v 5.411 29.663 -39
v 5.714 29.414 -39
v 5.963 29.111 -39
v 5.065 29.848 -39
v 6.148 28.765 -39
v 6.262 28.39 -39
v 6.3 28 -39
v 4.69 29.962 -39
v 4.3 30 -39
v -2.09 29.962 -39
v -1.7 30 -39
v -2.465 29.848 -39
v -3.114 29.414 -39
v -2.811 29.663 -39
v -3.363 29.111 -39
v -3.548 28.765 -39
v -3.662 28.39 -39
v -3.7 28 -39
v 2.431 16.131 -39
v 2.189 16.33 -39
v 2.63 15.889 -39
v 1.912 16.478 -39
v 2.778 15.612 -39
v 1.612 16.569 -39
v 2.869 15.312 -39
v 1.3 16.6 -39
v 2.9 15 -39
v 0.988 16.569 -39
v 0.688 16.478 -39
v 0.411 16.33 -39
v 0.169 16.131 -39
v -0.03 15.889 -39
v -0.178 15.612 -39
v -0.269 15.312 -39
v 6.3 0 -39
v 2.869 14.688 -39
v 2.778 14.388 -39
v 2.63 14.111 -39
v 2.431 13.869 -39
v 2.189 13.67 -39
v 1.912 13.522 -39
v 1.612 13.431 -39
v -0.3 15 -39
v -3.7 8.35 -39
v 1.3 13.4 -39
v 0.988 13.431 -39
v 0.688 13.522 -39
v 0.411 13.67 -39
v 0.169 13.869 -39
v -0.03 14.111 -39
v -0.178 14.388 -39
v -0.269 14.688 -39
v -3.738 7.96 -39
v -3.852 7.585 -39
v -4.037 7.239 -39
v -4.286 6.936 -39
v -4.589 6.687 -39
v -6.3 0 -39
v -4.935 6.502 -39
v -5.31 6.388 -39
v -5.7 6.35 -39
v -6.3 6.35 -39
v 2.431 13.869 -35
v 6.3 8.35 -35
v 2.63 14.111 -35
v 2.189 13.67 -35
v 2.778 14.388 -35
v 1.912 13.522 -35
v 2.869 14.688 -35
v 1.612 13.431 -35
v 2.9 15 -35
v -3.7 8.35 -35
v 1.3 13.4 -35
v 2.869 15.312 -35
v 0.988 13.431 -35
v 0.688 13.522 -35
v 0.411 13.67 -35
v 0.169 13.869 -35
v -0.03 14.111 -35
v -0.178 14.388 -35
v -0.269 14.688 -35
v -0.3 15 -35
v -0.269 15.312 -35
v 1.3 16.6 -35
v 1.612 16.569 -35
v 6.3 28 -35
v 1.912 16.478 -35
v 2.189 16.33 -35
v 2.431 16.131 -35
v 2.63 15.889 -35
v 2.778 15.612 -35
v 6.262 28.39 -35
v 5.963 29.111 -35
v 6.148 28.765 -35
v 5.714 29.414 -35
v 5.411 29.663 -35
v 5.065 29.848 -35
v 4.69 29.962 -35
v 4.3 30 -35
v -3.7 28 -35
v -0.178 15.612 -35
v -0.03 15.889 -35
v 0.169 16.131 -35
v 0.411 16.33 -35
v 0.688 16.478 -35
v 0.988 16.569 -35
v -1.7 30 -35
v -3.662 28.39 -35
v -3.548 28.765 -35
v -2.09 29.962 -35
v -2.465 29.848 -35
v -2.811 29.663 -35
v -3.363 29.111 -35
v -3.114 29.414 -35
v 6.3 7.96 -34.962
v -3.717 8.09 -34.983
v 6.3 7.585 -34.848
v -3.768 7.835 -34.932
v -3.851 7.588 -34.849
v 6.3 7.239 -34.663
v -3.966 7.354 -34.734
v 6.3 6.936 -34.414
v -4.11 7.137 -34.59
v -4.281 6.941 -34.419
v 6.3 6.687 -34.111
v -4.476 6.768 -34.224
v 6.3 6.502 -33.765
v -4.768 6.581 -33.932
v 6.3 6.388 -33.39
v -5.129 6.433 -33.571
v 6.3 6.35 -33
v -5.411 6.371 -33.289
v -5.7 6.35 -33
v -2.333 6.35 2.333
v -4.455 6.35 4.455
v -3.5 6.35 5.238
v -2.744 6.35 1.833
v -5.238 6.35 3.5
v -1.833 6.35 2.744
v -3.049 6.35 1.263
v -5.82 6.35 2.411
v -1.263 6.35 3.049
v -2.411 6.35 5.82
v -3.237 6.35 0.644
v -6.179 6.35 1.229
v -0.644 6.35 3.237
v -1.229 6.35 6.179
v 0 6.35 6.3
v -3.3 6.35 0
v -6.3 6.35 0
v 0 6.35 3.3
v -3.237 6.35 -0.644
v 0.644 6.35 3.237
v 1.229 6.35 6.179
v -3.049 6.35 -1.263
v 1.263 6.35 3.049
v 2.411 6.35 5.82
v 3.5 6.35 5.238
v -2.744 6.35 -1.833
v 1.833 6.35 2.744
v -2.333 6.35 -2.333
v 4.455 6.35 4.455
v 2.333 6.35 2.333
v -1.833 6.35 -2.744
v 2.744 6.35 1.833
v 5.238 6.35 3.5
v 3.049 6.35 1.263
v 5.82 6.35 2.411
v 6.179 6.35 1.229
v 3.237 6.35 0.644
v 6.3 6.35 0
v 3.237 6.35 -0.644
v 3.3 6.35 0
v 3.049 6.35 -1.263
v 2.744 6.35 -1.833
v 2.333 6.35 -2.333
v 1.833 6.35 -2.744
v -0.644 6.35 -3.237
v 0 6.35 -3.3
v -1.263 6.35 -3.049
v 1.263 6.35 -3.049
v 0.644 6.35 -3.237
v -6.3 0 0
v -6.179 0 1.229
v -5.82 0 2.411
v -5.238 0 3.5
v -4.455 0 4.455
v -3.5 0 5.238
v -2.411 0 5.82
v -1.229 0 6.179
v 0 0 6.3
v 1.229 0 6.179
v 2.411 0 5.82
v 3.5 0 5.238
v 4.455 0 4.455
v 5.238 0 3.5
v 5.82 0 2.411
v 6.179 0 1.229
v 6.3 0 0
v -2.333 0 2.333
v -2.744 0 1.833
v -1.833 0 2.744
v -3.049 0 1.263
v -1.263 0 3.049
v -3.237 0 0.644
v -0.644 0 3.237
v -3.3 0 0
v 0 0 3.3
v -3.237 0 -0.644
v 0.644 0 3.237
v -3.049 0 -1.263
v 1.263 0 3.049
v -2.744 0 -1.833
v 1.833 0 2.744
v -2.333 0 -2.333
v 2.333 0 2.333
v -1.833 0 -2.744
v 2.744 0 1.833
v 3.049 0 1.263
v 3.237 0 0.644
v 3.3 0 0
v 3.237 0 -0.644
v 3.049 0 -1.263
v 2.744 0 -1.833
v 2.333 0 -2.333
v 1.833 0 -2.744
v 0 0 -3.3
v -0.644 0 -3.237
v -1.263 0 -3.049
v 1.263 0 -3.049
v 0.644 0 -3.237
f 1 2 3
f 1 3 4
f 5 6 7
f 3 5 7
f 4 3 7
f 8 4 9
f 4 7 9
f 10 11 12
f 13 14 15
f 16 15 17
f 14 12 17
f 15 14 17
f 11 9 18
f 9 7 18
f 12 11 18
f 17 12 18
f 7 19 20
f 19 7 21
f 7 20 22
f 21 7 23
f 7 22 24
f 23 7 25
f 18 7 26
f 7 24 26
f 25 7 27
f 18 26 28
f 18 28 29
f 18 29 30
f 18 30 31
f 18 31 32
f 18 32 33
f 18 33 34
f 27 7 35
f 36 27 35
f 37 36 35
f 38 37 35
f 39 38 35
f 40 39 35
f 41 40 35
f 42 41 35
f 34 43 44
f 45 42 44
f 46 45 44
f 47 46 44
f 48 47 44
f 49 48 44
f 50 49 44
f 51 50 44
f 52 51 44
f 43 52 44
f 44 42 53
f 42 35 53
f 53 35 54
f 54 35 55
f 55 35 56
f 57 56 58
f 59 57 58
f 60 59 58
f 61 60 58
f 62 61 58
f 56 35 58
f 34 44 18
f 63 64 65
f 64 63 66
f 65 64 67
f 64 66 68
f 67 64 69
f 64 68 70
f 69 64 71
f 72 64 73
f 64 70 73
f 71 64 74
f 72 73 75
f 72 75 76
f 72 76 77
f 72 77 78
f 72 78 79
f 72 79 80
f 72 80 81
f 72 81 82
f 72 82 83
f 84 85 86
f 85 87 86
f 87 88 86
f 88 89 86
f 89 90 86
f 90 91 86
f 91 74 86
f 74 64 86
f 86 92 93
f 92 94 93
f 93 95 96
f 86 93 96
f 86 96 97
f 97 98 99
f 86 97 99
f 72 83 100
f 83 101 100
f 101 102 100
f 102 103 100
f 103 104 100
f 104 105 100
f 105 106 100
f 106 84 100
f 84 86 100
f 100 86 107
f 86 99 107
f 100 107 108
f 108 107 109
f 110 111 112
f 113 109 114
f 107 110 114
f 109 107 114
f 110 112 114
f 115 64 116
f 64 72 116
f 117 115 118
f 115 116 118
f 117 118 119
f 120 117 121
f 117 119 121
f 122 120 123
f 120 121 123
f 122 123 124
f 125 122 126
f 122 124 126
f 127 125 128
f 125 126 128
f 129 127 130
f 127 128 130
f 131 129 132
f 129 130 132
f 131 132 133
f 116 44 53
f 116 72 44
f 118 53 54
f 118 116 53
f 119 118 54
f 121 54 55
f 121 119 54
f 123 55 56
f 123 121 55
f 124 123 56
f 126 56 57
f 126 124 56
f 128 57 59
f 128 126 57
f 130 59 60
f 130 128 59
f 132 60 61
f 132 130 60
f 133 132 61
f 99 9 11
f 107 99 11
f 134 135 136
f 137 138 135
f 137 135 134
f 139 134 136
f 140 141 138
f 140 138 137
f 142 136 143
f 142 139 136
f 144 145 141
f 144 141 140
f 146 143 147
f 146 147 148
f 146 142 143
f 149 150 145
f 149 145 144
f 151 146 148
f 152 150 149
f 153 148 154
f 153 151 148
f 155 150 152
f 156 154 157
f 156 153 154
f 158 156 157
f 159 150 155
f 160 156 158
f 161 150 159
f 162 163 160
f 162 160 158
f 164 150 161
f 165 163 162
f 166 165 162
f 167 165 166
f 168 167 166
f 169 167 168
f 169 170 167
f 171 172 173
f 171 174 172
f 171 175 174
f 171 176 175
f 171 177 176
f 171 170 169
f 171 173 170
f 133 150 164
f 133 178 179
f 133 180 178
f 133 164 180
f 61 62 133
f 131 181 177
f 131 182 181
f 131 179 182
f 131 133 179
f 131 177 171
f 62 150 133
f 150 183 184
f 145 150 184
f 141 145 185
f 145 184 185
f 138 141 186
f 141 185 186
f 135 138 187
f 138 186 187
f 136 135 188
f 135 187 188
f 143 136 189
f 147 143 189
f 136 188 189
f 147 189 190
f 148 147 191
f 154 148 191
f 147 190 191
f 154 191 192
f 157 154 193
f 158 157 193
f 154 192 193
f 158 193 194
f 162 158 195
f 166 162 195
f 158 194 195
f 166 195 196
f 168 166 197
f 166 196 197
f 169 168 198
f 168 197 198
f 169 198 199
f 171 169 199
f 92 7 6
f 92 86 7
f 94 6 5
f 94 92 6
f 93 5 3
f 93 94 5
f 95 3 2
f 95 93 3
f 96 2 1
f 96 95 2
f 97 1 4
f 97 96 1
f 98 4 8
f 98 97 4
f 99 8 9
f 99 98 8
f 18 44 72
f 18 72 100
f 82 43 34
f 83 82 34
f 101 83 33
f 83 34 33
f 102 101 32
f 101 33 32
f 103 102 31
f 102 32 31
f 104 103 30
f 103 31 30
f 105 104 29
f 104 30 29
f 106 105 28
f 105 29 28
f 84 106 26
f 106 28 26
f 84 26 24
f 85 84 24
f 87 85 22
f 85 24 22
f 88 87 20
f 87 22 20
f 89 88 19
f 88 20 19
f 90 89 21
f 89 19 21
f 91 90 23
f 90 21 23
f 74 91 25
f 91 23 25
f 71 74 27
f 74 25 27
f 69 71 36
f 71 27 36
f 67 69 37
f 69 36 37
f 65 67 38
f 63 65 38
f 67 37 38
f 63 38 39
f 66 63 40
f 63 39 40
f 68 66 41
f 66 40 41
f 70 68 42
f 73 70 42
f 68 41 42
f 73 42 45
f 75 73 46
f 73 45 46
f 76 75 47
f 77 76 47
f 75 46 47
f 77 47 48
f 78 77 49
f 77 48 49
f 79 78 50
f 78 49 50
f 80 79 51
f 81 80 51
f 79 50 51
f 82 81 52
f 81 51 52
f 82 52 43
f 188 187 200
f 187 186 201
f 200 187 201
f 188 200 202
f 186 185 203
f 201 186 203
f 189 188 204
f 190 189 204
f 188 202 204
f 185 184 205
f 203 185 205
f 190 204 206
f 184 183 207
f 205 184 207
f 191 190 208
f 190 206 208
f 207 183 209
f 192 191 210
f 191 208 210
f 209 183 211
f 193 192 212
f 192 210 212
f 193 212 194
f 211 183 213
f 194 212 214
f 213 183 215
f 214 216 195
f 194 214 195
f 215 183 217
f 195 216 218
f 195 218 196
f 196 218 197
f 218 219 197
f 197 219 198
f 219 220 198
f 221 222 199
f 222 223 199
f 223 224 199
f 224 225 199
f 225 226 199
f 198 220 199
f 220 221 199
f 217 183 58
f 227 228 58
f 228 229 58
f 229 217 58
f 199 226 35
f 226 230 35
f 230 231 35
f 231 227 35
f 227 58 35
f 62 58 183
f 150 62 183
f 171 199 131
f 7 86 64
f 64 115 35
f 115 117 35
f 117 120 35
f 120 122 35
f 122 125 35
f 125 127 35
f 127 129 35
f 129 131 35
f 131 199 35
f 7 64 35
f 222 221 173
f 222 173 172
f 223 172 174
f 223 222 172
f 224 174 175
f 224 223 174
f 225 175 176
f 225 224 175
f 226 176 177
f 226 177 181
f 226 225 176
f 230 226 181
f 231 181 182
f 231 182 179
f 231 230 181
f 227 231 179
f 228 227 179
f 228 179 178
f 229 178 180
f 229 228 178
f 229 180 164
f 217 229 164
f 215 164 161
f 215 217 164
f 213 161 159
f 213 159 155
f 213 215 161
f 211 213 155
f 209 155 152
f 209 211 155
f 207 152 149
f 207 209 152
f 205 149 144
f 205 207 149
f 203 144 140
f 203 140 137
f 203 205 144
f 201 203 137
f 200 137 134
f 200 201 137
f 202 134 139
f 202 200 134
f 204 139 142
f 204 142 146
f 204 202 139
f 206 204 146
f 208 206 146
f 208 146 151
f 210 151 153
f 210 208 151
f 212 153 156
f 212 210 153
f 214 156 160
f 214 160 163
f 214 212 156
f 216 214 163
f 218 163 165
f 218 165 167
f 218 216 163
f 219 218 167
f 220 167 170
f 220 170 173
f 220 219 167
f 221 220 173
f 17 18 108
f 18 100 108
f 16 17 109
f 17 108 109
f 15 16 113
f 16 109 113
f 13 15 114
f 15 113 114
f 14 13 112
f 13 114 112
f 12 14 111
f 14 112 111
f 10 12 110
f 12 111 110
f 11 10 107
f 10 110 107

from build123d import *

# Parameters (mm, degrees)
SKETCH1_R           = 6.3
SKETCH1_R_2         = 3.3
BOSS_EXTRUDE1_DEPTH = 6.35
SKETCH2_W           = 10
SKETCH2_H           = 30
SKETCH2_R           = 1.6
BOSS_EXTRUDE2_DEPTH = 4
FILLET1_R           = 2


with BuildPart() as part:
    # Sketch1 → Boss-Extrude1 (new body)
    with BuildSketch(Plane(origin=(0, 0, 0), x_dir=(1, 0, 0), z_dir=(0, 1, 0))):
        Circle(SKETCH1_R)
        Circle(SKETCH1_R_2, mode=Mode.SUBTRACT)
        with BuildLine():
            Line((-6.3, 39), (-6.3, 0))
            ThreePointArc((-6.3, 0), (0, 6.3), (6.3, 0))
            Line((6.3, 0), (6.3, 39))
            Line((6.3, 39), (-6.3, 39))
        make_face()
    extrude(amount=BOSS_EXTRUDE1_DEPTH)

    # Sketch2 → Boss-Extrude2 (add)
    with BuildSketch(Plane(origin=(0, 0, -39), x_dir=(-1, 0, 0), z_dir=(0, 0, -1))):
        with Locations((-1.3, 15)):
            Rectangle(SKETCH2_W, SKETCH2_H)
        with Locations((-1.3, 15)):
            Circle(SKETCH2_R, mode=Mode.SUBTRACT)
    extrude(amount=-BOSS_EXTRUDE2_DEPTH)

    # Fillet1
    fillet1_edges = [part.edges().sort_by_distance(p)[0] for p in [
        (6.3, 30, -37),
        (-3.7, 6.35, -37),
        (-3.7, 30, -37),
        (1.3, 6.35, -35),
    ]]
    fillet(fillet1_edges, radius=FILLET1_R)


solid = part.part
